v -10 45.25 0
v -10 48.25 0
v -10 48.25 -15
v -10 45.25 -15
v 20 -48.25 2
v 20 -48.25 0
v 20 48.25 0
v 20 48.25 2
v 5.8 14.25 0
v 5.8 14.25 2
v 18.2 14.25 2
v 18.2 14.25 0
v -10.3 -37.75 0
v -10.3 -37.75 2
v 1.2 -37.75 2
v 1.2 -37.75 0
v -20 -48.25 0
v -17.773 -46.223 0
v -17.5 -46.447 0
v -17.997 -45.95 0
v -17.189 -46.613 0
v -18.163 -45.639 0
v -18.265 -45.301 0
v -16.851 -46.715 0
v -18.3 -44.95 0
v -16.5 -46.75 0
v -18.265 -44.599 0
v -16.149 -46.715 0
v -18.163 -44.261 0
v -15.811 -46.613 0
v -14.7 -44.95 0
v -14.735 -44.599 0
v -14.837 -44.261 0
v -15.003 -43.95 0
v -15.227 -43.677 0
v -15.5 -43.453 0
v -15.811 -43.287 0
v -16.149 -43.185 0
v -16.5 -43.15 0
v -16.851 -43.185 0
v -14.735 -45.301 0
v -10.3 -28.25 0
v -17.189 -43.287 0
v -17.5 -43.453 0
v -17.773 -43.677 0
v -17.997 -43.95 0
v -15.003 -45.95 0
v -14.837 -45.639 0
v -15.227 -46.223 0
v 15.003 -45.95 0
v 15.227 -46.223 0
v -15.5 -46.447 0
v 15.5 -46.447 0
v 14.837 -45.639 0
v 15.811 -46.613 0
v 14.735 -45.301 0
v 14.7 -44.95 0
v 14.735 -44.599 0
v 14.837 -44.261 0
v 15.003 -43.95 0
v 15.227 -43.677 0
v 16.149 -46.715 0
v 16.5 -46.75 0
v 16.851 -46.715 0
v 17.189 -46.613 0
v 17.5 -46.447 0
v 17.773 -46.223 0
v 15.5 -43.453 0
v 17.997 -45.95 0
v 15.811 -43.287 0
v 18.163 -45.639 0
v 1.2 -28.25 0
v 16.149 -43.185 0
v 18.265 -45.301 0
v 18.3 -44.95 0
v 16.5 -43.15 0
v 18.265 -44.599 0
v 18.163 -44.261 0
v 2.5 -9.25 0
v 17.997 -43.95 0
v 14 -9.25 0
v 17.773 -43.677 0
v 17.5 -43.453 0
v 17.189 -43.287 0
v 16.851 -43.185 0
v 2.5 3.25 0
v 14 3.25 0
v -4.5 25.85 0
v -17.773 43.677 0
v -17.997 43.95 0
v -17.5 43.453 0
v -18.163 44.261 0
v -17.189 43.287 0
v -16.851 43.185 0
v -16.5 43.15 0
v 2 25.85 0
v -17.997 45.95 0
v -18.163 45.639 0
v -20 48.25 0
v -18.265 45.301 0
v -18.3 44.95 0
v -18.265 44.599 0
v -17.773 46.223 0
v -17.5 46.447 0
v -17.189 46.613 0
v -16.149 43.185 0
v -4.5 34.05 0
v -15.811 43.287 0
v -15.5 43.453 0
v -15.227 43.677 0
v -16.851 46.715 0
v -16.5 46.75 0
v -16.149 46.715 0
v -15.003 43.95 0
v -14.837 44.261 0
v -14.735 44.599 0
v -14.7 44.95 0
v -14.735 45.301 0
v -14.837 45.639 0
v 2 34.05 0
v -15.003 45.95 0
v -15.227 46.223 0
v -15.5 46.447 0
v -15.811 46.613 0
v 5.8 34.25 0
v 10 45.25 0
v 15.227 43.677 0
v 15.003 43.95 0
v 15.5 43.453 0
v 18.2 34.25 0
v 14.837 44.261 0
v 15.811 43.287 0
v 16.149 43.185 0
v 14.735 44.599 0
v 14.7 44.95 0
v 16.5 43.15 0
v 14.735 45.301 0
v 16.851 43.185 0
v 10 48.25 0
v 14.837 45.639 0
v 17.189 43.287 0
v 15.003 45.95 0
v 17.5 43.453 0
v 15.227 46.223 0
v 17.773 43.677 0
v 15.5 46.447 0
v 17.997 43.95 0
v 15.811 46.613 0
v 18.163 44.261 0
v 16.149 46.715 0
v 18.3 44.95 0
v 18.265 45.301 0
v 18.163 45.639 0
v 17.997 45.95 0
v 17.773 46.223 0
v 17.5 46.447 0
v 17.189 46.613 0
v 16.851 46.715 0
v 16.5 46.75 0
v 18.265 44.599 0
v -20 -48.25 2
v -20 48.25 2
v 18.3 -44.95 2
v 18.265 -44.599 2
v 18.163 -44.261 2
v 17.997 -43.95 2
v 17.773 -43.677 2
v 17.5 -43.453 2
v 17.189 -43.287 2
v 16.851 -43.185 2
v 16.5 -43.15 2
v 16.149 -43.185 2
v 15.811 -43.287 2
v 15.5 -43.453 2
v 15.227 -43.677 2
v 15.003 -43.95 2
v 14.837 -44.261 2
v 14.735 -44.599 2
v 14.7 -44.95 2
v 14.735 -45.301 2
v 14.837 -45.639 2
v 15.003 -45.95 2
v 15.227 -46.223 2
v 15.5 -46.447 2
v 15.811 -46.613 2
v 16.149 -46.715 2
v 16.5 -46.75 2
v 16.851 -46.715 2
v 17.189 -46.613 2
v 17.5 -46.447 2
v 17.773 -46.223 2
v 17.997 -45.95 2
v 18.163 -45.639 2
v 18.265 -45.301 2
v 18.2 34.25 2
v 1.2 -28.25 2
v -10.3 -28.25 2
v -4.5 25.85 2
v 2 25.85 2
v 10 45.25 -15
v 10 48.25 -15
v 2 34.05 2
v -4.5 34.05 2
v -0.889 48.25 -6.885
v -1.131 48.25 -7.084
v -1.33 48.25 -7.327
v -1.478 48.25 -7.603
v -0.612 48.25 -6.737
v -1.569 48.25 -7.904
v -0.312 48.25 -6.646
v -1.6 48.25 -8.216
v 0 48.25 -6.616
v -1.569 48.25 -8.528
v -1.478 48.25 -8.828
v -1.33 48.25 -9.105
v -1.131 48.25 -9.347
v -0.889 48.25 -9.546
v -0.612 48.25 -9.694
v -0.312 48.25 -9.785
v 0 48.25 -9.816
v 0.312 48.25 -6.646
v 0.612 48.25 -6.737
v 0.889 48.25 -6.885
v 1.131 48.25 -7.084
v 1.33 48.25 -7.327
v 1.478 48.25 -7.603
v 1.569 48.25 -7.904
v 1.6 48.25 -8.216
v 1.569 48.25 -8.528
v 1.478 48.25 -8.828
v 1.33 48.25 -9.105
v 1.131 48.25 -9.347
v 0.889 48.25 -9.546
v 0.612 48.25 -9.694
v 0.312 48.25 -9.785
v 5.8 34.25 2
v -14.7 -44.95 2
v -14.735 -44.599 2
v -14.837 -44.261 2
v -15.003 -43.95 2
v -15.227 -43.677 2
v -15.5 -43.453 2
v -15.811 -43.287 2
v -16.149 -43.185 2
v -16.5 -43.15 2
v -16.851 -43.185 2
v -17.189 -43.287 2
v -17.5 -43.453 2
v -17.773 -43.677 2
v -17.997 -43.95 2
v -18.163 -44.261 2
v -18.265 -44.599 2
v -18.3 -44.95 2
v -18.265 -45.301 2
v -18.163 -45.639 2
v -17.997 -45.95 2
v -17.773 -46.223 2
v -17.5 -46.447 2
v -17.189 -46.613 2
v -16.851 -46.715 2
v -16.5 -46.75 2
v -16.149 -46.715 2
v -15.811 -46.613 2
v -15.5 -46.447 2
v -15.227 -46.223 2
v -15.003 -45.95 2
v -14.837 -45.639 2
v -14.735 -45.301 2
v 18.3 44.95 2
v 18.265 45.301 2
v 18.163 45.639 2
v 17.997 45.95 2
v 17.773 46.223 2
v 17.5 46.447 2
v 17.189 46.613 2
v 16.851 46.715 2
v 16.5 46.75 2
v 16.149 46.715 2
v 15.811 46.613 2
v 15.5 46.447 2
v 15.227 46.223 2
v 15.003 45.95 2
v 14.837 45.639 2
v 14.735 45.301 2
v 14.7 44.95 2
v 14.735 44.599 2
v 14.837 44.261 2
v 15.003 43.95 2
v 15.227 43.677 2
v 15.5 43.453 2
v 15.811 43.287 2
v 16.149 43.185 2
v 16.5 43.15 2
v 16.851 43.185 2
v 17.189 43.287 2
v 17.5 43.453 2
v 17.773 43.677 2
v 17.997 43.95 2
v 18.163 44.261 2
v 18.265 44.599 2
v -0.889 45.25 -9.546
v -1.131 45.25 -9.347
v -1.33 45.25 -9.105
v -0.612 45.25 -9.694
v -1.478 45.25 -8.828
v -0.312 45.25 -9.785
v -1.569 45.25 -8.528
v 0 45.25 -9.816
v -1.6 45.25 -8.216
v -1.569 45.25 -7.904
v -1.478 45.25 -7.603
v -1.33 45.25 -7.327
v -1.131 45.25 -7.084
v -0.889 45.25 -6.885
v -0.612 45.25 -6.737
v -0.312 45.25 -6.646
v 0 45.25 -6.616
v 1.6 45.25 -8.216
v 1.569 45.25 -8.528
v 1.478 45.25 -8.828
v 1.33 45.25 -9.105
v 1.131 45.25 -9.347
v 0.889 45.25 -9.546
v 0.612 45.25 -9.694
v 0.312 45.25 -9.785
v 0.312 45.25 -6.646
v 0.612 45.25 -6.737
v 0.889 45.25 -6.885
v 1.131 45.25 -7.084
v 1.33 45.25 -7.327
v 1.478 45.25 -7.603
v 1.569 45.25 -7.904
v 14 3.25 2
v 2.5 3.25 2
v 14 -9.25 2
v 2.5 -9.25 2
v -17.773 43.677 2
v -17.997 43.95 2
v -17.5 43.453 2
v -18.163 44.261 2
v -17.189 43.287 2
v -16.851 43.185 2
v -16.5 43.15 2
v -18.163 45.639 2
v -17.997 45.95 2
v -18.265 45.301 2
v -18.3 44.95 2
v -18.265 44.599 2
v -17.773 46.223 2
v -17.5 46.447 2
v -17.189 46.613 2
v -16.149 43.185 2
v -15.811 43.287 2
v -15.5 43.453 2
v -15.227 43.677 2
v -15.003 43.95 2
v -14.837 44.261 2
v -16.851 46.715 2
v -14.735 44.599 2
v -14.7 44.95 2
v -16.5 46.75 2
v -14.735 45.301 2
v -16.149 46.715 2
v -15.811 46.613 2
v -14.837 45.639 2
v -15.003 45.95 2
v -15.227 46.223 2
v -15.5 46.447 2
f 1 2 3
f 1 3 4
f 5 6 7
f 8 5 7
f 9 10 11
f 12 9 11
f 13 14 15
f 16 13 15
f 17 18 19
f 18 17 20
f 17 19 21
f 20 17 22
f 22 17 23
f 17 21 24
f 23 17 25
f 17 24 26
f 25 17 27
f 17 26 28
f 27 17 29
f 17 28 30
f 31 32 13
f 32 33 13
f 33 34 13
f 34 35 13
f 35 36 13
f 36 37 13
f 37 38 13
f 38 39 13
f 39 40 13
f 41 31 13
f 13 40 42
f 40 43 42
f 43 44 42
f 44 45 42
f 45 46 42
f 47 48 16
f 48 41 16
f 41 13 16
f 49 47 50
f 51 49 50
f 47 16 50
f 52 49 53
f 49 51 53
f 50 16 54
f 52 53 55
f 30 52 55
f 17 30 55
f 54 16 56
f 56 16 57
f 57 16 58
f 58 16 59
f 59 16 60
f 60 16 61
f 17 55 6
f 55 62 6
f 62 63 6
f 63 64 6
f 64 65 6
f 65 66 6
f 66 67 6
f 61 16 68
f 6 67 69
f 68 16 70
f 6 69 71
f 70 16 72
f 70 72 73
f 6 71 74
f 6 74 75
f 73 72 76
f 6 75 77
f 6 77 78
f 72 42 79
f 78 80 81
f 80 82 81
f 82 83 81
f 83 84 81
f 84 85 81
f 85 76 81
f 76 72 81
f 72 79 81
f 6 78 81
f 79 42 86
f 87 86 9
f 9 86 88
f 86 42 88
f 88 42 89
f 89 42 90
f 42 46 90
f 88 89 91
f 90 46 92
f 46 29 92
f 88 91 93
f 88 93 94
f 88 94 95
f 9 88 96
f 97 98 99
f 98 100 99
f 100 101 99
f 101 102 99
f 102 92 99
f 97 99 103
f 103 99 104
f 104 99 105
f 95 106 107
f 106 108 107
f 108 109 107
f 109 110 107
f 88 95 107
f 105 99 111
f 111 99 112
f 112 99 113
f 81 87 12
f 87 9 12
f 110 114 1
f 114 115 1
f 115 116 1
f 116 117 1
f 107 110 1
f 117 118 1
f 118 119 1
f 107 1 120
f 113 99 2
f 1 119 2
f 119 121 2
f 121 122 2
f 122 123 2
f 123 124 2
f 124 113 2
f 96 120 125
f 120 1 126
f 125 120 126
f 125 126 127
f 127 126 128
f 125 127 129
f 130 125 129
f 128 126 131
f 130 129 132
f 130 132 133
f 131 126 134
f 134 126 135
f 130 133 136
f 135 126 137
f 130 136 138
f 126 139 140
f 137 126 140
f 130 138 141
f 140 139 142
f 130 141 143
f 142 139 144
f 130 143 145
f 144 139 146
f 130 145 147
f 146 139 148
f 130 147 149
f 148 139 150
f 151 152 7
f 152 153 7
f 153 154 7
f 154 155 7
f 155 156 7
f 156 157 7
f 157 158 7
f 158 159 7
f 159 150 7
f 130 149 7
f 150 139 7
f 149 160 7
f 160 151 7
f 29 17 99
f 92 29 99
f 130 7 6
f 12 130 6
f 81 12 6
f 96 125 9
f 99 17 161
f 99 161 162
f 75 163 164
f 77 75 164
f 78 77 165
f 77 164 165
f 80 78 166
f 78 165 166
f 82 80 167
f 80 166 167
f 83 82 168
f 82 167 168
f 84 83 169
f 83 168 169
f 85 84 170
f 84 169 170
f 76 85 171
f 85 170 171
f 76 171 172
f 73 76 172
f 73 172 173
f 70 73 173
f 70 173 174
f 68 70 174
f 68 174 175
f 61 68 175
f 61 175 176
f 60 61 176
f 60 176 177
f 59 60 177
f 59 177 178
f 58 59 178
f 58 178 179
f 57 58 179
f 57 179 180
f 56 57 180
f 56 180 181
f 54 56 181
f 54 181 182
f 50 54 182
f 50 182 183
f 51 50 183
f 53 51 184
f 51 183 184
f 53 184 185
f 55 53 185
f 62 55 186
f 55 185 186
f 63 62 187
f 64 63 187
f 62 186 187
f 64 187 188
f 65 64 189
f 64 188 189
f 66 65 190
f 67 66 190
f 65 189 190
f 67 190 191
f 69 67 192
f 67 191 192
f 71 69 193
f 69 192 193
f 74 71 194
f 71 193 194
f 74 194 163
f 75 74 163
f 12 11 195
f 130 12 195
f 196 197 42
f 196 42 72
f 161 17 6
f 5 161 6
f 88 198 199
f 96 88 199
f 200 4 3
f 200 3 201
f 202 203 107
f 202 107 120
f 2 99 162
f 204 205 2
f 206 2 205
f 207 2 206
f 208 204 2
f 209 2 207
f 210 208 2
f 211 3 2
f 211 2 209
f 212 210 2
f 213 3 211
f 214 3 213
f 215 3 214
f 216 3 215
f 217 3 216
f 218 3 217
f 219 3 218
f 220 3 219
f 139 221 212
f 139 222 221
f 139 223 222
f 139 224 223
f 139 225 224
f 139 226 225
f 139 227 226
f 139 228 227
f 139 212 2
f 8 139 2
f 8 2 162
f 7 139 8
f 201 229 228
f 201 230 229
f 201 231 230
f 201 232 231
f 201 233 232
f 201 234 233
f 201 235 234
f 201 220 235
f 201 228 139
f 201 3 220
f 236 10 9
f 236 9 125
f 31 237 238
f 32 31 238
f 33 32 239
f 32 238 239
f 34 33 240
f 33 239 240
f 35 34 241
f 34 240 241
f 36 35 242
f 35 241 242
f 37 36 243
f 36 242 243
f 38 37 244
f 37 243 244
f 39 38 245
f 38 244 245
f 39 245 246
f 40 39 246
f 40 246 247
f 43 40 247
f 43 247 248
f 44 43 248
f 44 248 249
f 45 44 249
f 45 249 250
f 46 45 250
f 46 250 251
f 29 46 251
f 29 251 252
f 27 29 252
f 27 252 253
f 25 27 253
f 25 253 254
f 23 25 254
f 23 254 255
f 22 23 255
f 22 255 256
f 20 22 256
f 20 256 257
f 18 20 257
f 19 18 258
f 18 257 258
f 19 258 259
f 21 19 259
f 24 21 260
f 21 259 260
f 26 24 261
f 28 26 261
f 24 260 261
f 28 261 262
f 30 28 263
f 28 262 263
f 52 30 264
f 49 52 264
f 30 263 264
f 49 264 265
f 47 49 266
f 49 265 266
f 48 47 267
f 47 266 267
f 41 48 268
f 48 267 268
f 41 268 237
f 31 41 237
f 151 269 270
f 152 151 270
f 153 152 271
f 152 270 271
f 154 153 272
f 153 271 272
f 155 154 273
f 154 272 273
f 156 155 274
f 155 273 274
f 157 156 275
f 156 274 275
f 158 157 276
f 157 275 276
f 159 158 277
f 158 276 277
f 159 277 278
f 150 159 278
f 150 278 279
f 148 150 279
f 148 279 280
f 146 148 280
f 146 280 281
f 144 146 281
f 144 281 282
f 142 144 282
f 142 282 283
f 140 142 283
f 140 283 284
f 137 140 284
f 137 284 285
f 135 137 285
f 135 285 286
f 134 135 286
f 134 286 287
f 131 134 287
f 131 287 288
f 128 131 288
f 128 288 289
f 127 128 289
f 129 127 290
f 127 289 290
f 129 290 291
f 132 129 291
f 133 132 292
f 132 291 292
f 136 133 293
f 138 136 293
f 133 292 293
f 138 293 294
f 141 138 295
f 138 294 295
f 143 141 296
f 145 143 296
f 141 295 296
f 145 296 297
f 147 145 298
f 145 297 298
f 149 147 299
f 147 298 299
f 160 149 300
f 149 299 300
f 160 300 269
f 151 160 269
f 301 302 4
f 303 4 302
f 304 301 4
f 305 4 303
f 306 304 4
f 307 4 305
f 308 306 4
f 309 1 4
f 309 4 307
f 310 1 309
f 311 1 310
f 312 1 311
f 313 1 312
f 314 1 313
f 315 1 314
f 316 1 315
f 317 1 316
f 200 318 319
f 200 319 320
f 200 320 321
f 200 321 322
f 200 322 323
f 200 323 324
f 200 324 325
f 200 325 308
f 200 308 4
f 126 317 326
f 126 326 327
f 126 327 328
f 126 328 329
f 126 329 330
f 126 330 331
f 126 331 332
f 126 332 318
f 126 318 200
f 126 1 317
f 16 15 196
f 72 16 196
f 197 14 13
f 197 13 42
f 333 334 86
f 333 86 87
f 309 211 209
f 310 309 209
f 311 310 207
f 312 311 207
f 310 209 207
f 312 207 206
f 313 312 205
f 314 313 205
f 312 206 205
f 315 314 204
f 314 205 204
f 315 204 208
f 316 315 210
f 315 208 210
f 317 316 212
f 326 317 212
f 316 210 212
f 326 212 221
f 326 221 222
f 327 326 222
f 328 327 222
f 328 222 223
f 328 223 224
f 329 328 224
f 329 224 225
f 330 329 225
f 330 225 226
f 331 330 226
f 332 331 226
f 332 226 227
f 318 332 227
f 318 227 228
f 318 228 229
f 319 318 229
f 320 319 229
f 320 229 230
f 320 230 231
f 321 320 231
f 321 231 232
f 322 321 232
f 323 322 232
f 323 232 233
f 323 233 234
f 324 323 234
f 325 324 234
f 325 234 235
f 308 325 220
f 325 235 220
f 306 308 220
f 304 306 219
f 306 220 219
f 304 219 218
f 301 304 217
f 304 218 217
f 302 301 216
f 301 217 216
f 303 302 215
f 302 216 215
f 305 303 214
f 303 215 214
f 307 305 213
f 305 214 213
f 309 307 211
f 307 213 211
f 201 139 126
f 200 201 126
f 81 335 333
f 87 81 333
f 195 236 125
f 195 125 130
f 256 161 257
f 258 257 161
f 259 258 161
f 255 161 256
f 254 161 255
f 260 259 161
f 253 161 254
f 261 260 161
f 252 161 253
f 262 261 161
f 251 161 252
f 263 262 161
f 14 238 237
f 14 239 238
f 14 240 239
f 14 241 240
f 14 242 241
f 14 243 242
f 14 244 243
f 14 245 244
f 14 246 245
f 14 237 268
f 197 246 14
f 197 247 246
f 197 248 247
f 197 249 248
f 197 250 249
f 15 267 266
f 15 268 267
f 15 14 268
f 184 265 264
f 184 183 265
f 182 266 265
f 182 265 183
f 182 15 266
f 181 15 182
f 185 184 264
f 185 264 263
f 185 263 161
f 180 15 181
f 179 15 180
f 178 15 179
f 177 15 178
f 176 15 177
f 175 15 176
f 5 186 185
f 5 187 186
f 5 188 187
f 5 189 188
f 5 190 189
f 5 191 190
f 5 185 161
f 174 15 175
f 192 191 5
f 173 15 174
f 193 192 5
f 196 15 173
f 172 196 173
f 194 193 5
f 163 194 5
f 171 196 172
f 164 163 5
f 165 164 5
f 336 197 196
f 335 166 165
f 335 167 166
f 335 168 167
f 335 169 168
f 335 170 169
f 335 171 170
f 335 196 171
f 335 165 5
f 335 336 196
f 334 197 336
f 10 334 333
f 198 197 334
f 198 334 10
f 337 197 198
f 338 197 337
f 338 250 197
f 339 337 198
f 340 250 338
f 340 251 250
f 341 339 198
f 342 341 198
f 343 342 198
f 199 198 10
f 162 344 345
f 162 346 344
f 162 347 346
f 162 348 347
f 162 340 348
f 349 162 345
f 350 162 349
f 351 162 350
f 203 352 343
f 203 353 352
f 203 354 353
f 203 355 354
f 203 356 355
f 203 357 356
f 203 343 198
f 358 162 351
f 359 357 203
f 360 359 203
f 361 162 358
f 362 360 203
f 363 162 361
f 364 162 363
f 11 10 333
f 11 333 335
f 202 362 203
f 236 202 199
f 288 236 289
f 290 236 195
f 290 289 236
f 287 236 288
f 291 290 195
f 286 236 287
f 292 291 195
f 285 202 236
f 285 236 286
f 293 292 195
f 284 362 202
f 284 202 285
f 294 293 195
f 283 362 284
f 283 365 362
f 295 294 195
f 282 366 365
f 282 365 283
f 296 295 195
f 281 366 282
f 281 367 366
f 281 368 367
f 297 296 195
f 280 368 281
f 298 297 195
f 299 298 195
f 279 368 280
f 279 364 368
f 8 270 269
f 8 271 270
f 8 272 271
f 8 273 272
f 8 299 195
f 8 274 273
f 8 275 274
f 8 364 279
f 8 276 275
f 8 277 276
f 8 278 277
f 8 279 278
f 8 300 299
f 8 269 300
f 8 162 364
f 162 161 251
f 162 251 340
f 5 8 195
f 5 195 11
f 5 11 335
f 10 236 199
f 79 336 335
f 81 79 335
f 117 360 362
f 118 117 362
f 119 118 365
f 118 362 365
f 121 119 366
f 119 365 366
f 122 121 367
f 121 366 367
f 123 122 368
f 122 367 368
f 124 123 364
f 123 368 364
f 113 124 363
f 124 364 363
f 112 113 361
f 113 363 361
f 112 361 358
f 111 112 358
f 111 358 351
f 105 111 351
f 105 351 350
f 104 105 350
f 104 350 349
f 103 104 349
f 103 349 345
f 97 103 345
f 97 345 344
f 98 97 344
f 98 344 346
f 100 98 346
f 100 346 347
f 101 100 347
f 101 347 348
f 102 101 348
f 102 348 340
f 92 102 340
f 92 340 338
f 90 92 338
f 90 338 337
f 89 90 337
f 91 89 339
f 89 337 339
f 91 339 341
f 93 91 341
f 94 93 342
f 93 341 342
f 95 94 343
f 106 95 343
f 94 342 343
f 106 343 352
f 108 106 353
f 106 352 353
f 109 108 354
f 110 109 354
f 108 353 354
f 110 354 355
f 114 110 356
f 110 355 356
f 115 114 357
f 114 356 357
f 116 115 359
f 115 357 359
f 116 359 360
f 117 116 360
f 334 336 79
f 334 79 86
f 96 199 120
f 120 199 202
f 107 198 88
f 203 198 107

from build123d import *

# Parameters (mm, degrees)
SKETCH_W        = 40
SKETCH_H        = 96.5
PAD_DEPTH       = 2
SKETCH001_R     = 1.8
SKETCH001_W     = 11.5
SKETCH001_H     = 12.5
SKETCH001_W_2   = 6.5
SKETCH001_H_2   = 8.2
SKETCH001_H_3   = 9.5
SKETCH001_W_3   = 12.4
SKETCH001_H_4   = 20
POCKET_DEPTH    = 5
SKETCH002_W     = 20
SKETCH002_H     = 3
PAD001_DEPTH    = 15
SKETCH003_R     = 1.6
POCKET001_DEPTH = 5


with BuildPart() as part:
    # Sketch → Pad (new body)
    with BuildSketch(Plane.XY):
        Rectangle(SKETCH_W, SKETCH_H)
    extrude(amount=PAD_DEPTH)

    # Sketch001 (on Face6 of Pad) → Pocket (cut)
    with BuildSketch(Plane.XY.offset(2)):
        with Locations((-16.5, 44.95)):
            Circle(SKETCH001_R)
        with Locations((16.5, 44.95)):
            Circle(SKETCH001_R)
        with Locations((-16.5, -44.95)):
            Circle(SKETCH001_R)
        with Locations((16.5, -44.95)):
            Circle(SKETCH001_R)
        with Locations((8.25, -3)):
            Rectangle(SKETCH001_W, SKETCH001_H)
        with Locations((-1.25, 29.95)):
            Rectangle(SKETCH001_W_2, SKETCH001_H_2)
        with Locations((-4.55, -33)):
            Rectangle(SKETCH001_W, SKETCH001_H_3)
        with Locations((12, 24.25)):
            Rectangle(SKETCH001_W_3, SKETCH001_H_4)
    extrude(amount=-POCKET_DEPTH, mode=Mode.SUBTRACT)

    # Sketch002 (on Face4 of Pocket) → Pad001 (join)
    with BuildSketch(Plane(origin=(0, 0, 0), x_dir=(1, 0, 0), z_dir=(0, 0, -1))):
        with Locations((0, -46.75)):
            Rectangle(SKETCH002_W, SKETCH002_H)
    extrude(amount=PAD001_DEPTH)

    # Sketch003 (on Face5 of Pad001) → Pocket001 (cut)
    with BuildSketch(Plane(origin=(0, 48.25, 0), x_dir=(-1, 0, 0), z_dir=(0, 1, 0))):
        with Locations((0, -8.215687)):
            Circle(SKETCH003_R)
    extrude(amount=-POCKET001_DEPTH, mode=Mode.SUBTRACT)


solid = part.part
